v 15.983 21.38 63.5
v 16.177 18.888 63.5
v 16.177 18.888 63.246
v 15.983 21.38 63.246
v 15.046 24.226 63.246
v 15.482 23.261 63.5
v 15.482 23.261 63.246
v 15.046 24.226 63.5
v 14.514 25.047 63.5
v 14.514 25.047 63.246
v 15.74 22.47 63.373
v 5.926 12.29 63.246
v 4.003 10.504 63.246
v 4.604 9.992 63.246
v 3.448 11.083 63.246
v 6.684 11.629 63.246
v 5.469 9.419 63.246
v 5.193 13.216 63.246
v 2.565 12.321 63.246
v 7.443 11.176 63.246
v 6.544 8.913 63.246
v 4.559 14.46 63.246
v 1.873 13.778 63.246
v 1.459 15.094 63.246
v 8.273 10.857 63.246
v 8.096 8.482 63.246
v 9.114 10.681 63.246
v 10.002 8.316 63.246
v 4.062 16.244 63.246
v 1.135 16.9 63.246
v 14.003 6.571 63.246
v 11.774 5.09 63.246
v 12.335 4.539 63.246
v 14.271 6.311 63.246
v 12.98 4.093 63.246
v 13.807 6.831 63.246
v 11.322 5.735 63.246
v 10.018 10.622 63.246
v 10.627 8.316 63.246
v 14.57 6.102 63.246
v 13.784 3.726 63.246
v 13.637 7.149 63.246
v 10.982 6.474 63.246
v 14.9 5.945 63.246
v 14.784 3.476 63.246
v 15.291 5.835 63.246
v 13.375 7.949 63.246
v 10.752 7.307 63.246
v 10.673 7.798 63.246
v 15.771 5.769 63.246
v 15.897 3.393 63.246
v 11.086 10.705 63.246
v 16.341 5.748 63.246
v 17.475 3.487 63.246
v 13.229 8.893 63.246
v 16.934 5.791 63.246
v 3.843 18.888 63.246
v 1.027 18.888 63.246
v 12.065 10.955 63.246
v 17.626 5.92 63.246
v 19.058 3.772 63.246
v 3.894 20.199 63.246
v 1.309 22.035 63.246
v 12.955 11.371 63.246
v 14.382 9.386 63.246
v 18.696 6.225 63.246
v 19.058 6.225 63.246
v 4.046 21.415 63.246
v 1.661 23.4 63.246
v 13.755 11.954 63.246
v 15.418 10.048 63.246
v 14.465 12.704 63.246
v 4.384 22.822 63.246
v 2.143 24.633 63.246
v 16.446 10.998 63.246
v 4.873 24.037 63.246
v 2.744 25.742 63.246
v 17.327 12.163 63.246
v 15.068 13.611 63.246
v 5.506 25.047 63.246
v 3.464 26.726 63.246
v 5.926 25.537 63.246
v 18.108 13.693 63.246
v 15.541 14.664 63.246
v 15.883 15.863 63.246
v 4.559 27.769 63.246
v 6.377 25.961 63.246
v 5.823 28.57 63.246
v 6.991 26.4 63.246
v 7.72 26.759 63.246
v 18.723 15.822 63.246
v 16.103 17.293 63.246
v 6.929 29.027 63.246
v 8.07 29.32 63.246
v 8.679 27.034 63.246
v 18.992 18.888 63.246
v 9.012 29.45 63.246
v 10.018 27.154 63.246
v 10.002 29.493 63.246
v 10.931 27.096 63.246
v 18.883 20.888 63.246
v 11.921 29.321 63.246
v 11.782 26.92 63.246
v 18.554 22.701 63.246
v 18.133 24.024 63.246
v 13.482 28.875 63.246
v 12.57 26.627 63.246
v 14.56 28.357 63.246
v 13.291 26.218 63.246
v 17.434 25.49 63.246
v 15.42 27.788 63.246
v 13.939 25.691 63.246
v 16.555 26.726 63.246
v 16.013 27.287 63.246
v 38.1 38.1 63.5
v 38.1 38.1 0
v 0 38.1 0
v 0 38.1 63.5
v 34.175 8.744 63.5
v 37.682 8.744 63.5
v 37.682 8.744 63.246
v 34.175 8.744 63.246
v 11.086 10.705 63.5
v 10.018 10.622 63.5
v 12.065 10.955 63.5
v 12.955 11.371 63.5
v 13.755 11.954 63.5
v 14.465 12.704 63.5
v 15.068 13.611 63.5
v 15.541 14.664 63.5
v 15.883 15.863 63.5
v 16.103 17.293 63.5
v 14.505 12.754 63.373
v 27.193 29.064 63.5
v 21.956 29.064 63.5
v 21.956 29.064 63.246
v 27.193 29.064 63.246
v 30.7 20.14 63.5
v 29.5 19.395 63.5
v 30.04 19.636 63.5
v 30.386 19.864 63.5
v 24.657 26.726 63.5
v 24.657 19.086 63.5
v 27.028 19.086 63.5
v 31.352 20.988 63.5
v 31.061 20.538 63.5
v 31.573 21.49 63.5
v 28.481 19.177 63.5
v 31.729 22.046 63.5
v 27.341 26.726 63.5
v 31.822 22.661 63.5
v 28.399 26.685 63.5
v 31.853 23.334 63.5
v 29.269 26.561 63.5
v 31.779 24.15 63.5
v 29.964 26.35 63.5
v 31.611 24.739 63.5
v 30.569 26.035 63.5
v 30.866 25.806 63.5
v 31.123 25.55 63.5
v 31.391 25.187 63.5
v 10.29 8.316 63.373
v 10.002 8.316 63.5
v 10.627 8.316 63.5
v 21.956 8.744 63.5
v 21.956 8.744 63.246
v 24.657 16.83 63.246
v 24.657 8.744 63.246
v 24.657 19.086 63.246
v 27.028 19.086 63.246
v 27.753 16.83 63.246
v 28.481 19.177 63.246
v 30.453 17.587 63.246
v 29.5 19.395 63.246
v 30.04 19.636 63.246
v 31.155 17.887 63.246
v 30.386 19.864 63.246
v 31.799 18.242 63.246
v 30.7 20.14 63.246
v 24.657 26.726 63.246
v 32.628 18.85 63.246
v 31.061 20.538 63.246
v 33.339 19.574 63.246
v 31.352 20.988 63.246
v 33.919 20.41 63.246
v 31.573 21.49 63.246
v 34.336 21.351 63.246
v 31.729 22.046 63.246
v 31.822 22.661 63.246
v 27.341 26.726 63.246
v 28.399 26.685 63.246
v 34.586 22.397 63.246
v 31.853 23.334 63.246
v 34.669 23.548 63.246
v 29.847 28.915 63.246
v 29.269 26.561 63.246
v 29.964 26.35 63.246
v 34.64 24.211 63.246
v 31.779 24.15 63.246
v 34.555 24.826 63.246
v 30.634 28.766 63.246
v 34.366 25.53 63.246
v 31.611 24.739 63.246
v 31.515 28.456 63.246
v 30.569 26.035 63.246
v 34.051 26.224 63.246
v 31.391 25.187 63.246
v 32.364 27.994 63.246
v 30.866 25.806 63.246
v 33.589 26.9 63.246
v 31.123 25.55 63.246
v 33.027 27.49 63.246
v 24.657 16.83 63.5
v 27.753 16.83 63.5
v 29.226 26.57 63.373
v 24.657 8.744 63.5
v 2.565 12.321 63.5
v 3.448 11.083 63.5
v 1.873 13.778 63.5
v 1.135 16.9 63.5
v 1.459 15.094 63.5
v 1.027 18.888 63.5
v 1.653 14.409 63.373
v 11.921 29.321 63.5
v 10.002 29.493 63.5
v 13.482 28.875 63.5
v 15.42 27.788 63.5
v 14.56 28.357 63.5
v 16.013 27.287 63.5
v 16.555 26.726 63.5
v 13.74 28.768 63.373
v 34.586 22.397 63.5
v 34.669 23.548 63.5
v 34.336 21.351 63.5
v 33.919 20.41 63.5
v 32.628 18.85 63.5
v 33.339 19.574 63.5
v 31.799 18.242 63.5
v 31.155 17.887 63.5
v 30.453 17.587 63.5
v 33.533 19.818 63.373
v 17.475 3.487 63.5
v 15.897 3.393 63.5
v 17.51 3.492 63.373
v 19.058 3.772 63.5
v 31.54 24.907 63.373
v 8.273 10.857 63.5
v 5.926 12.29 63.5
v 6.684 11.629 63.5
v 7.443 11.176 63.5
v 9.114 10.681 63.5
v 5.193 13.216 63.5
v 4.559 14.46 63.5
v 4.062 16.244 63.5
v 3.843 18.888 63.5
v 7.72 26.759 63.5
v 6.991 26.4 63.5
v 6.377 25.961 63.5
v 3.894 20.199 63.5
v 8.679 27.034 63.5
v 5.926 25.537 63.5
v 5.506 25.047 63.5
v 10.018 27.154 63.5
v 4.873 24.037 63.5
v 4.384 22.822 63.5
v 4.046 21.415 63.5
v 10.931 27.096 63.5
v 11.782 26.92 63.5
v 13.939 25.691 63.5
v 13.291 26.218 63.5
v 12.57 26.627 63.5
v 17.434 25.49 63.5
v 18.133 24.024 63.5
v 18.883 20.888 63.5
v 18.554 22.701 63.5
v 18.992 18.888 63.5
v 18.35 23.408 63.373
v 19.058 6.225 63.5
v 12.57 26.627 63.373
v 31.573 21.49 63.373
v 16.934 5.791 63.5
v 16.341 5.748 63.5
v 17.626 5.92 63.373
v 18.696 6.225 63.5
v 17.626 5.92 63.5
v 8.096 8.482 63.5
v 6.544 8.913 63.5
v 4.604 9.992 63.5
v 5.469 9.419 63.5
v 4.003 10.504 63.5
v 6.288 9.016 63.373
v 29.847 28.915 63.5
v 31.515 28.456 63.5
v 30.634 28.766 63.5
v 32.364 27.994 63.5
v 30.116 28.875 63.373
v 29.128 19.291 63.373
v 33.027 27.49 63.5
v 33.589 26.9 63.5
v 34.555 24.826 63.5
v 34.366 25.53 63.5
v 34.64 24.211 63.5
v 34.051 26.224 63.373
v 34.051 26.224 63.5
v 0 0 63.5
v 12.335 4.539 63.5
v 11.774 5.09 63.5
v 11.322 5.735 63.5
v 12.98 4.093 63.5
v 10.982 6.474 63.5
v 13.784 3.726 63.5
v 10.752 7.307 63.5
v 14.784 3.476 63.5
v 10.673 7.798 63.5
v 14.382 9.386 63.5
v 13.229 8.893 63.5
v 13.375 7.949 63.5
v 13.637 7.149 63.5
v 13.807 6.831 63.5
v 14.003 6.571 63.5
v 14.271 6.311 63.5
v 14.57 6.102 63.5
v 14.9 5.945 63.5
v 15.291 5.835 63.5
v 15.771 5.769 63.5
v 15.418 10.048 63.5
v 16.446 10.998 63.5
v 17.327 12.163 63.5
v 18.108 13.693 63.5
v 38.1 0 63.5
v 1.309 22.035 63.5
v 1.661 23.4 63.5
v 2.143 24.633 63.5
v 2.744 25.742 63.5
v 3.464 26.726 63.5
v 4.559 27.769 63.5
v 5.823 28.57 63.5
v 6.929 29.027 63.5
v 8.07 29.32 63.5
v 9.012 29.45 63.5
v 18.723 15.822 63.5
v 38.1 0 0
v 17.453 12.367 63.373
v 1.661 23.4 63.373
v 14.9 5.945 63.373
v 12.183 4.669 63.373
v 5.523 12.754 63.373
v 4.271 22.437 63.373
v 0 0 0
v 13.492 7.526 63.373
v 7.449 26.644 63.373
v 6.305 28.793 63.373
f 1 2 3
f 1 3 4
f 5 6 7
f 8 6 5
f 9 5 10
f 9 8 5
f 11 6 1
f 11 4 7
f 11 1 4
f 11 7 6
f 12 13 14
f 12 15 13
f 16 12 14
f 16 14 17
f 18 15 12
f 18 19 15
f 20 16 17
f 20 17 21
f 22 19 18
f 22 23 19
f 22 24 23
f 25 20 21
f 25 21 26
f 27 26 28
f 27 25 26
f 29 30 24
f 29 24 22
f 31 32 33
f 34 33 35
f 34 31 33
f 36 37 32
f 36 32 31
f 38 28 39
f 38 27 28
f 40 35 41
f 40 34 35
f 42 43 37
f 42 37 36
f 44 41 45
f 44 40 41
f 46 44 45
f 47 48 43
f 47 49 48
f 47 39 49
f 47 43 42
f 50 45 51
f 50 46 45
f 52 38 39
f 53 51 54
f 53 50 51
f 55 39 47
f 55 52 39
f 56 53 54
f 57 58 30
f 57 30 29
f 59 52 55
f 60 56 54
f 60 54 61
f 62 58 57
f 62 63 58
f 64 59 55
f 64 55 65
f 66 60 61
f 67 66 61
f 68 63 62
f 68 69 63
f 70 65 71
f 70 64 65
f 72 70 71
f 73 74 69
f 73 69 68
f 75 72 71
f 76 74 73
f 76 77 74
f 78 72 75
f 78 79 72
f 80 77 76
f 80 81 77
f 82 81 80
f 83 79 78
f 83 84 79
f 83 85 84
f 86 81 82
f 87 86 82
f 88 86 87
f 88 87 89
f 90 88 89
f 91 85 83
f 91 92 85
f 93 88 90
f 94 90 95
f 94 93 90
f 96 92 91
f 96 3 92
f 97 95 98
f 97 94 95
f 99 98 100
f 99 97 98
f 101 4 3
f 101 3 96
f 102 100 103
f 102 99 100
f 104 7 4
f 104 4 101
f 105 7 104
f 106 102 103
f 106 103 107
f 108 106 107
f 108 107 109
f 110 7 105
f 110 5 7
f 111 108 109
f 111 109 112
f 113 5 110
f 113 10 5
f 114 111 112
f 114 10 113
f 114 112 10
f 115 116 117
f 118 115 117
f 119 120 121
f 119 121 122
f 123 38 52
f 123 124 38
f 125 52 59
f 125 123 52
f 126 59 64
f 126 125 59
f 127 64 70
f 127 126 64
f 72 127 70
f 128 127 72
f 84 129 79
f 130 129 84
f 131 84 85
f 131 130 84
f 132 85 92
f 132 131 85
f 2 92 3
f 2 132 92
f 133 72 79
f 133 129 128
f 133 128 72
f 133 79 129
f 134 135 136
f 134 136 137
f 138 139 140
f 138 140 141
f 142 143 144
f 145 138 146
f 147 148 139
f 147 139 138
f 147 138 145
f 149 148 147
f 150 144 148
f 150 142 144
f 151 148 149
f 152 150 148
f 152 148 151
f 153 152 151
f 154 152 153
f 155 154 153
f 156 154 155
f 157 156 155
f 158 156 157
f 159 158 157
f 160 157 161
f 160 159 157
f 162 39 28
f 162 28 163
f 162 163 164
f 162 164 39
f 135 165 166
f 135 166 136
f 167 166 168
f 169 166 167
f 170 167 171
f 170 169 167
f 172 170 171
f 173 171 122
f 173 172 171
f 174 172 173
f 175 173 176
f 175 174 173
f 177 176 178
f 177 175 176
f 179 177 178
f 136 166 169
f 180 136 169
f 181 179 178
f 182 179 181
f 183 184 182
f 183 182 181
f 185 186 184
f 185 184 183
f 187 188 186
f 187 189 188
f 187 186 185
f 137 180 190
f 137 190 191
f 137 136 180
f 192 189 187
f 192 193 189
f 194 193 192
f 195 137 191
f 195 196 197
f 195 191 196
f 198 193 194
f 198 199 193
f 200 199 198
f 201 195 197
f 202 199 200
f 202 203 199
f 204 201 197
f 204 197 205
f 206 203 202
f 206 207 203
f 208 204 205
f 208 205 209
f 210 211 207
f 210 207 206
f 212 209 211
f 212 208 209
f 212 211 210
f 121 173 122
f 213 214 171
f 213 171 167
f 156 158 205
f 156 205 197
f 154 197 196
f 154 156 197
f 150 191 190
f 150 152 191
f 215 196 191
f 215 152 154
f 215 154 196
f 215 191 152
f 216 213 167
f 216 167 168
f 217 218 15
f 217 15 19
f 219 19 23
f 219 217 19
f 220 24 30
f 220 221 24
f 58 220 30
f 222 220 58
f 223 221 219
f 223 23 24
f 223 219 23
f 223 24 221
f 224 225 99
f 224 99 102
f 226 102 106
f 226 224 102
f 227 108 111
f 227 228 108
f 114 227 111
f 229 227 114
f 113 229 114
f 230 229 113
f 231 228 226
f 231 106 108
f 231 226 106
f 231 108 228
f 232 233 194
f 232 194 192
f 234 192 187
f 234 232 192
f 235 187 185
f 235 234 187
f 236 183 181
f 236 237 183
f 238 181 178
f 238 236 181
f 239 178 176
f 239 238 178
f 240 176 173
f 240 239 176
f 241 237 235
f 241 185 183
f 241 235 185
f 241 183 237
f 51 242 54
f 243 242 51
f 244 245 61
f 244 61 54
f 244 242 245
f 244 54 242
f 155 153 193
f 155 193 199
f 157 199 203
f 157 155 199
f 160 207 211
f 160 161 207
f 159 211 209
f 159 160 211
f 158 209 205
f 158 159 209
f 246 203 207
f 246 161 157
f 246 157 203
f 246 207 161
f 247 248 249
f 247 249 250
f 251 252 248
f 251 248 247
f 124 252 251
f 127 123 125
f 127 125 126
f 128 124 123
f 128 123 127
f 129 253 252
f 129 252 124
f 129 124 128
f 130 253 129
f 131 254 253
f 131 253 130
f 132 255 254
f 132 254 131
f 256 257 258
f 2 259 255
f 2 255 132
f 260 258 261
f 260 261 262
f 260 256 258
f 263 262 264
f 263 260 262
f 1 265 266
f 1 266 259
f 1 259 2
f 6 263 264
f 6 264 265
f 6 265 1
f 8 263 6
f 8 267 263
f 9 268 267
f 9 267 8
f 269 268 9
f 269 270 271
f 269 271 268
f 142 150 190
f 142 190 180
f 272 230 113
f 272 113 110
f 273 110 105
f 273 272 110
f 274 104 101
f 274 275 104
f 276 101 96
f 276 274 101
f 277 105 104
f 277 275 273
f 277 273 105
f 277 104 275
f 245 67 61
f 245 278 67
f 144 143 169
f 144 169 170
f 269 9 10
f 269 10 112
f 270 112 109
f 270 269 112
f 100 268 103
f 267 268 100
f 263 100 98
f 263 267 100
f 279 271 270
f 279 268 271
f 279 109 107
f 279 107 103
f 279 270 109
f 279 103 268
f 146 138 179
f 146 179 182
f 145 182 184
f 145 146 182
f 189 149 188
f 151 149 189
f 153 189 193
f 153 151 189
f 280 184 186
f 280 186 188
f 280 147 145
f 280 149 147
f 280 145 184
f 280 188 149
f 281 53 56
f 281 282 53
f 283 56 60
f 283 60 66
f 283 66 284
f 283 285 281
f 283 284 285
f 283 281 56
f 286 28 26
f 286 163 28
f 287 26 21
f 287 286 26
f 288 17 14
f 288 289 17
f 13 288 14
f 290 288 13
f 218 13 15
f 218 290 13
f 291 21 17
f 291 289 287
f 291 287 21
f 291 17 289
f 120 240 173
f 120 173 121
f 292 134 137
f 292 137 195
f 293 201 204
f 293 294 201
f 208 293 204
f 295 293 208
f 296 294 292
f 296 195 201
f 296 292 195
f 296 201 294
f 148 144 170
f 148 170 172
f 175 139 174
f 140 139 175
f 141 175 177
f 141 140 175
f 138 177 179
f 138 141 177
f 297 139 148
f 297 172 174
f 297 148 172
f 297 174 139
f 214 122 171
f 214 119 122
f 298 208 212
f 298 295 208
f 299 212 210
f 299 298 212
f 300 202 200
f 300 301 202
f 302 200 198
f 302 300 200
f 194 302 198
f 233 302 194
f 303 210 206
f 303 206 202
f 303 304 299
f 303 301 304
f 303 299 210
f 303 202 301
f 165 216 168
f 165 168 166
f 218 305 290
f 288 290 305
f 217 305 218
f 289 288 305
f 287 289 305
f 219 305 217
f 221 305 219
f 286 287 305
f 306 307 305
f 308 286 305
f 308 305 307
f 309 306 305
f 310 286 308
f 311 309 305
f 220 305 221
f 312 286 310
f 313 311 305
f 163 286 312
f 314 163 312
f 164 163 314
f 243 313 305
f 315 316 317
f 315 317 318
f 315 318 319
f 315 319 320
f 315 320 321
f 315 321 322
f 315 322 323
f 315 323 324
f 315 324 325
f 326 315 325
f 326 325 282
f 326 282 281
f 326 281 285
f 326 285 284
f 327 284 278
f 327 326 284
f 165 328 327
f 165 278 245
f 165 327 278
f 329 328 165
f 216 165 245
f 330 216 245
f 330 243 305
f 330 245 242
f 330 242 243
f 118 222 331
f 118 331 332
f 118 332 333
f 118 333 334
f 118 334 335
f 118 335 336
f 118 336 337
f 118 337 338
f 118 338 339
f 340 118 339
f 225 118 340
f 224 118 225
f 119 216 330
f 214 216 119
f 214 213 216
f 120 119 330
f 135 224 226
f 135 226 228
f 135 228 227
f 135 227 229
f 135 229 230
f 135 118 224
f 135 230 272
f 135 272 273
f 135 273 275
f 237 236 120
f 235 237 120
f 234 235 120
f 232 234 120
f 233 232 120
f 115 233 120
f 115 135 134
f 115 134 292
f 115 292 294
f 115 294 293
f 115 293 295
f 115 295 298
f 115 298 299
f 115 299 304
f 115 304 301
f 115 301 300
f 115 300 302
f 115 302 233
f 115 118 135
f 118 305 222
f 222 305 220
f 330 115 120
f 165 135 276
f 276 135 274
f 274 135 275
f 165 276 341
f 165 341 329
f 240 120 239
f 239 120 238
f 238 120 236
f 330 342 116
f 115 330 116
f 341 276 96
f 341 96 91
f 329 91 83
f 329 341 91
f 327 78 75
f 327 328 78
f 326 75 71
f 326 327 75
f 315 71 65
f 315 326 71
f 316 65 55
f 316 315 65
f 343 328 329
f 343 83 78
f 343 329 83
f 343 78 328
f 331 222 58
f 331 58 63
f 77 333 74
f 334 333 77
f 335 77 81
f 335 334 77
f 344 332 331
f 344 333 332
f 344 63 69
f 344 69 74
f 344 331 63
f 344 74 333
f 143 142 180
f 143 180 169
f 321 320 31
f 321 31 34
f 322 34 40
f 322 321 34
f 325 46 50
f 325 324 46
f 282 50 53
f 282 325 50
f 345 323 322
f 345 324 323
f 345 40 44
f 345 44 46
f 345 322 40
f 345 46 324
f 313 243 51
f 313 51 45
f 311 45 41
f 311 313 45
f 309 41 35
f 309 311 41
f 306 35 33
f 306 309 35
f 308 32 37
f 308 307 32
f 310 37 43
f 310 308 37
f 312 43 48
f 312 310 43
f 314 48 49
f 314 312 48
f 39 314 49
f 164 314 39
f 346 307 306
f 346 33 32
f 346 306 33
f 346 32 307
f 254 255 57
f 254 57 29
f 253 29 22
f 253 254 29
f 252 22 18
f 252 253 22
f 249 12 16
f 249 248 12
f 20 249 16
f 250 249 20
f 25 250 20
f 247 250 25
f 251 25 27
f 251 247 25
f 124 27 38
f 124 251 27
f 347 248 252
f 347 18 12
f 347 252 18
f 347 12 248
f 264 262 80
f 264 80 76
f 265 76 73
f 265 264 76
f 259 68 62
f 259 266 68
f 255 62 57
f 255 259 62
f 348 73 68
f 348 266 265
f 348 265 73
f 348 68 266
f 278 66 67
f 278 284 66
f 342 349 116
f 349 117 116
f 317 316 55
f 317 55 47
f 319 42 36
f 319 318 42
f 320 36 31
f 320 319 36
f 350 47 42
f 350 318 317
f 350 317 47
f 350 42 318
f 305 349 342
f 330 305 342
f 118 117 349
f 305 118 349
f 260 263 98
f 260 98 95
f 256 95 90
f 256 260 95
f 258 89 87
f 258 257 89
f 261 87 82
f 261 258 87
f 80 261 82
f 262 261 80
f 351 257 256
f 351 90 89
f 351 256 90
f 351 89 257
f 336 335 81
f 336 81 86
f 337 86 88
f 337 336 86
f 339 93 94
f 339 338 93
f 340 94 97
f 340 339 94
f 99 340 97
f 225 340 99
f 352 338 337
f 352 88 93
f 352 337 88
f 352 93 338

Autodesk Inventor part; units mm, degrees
ref_plane "YZ Plane" through (0, 0, 0) normal (1, 0, 0) x (0, 1, 0)
ref_plane "XZ Plane" through (0, 0, 0) normal (0, 1, 0) x (-1, 0, 0)
ref_plane "XY Plane" through (0, 0, 0) normal (0, 0, 1) x (1, 0, 0)
sketch "Sketch1" plane through (0, 0, 0) normal (0, 0, 1) x (1, 0, 0)
  line L0 (0, 0) -> (38.1, 0)
  line L1 (38.1, 0) -> (38.1, 38.1)
  line L2 (38.1, 38.1) -> (0, 38.1)
  line L3 (0, 38.1) -> (0, 0)
  dimension "d0" = 38.1
  dimension "d1" = 38.1
extrude "Extrusion1" add sketch "Sketch1" along normal blind 63.5
sketch "Sketch2" plane through (0, 0, 63.5) normal (0, 0, 1) x (1, 0, 0)
  line L0 (0.1215, 29.4926) -> (23.3191, 29.4926) construction
  line L1 (23.3191, 29.4926) -> (23.3191, 13.1802) construction
  line L2 (23.3191, 13.1802) -> (0.1215, 13.1802) construction
  line L3 (0.1215, 13.1802) -> (0.1215, 29.4926) construction
  spline S0 degree 2 poles (19.0583, 3.7715) (18.3173, 3.5904) (16.7036, 3.3928) (15.8967, 3.3928) knots 0 0 0 1 2 2 2
  spline S1 degree 2 poles (15.8967, 3.3928) (13.6078, 3.3928) (10.7591, 5.9451) (10.6273, 8.3164) knots 0 0 0 1 2 2 2
  spline S2 degree 2 poles (10.6273, 8.3164) (10.4462, 8.3164) (10.1333, 8.3164) (10.0016, 8.3164) knots 0 0 0 1 2 2 2
  spline S3 degree 2 poles (10.0016, 8.3164) (7.9432, 8.3164) (4.6334, 9.716) (3.4478, 11.0828) knots 0 0 0 1 2 2 2
  spline S4 degree 2 poles (3.4478, 11.0828) (2.2787, 12.4331) (1.0272, 16.3851) (1.0272, 18.888) knots 0 0 0 1 2 2 2
  spline S5 degree 2 poles (1.0272, 18.888) (1.0272, 21.4569) (2.2951, 25.343) (3.4643, 26.7262) knots 0 0 0 1 2 2 2
  spline S6 degree 2 poles (3.4643, 26.7262) (4.6499, 28.093) (7.9597, 29.4926) (10.0016, 29.4926) knots 0 0 0 1 2 2 2
  spline S7 degree 2 poles (10.0016, 29.4926) (12.0764, 29.4926) (15.4027, 28.0436) (16.5554, 26.7262) knots 0 0 0 1 2 2 2
  spline S8 degree 2 poles (16.5554, 26.7262) (17.708, 25.3924) (18.9924, 21.4239) (18.9924, 18.888) knots 0 0 0 1 2 2 2
  spline S9 degree 2 poles (18.9924, 18.888) (18.9924, 14.936) (15.9132, 9.7984) (13.2291, 8.8927) knots 0 0 0 1 2 2 2
  spline S10 degree 2 poles (13.2291, 8.8927) (13.2949, 8.1352) (13.6901, 6.9167) (14.003, 6.5709) knots 0 0 0 1 2 2 2
  spline S11 degree 2 poles (14.003, 6.5709) (14.3817, 6.1427) (15.4191, 5.7475) (16.3413, 5.7475) knots 0 0 0 1 2 2 2
  spline S12 degree 2 poles (16.3413, 5.7475) (16.8847, 5.7475) (18.3667, 6.0933) (18.696, 6.2251) knots 0 0 0 1 2 2 2
  line L4 (18.696, 6.2251) -> (19.0583, 6.2251)
  line L5 (19.0583, 6.2251) -> (19.0583, 3.7715)
  spline S13 degree 2 poles (16.1766, 18.888) (16.1766, 20.9134) (15.3039, 24.0257) (14.5135, 25.0466) knots 0 0 0 1 2 2 2
  spline S14 degree 2 poles (14.5135, 25.0466) (13.7066, 26.1005) (11.4342, 27.1544) (10.018, 27.1544) knots 0 0 0 1 2 2 2
  spline S15 degree 2 poles (10.018, 27.1544) (8.5525, 27.1544) (6.346, 26.1334) (5.5062, 25.0466) knots 0 0 0 1 2 2 2
  spline S16 degree 2 poles (5.5062, 25.0466) (4.6993, 24.0092) (3.843, 20.864) (3.843, 18.888) knots 0 0 0 1 2 2 2
  spline S17 degree 2 poles (3.843, 18.888) (3.843, 14.8866) (7.2022, 10.6217) (10.018, 10.6217) knots 0 0 0 1 2 2 2
  spline S18 degree 2 poles (10.018, 10.6217) (12.8339, 10.6217) (16.1766, 14.8866) (16.1766, 18.888) knots 0 0 0 1 2 2 2
  line L6 (37.6822, 8.7445) -> (34.1748, 8.7445)
  line L7 (34.1748, 8.7445) -> (27.7528, 16.8297)
  line L8 (27.7528, 16.8297) -> (24.657, 16.8297)
  line L9 (24.657, 16.8297) -> (24.657, 8.7445)
  line L10 (24.657, 8.7445) -> (21.9565, 8.7445)
  line L11 (21.9565, 8.7445) -> (21.9565, 29.0645)
  line L12 (21.9565, 29.0645) -> (27.1929, 29.0645)
  spline S19 degree 2 poles (27.1929, 29.0645) (28.9384, 29.0645) (31.2931, 28.6858) (32.3635, 27.9942) knots 0 0 0 1 2 2 2
  spline S20 degree 2 poles (32.3635, 27.9942) (33.4338, 27.3026) (34.6688, 25.1454) (34.6688, 23.5481) knots 0 0 0 1 2 2 2
  spline S21 degree 2 poles (34.6688, 23.5481) (34.6688, 21.3251) (32.3964, 18.3117) (30.4533, 17.5872) knots 0 0 0 1 2 2 2
  line L13 (30.4533, 17.5872) -> (37.6822, 8.7445)
  spline S22 degree 2 poles (31.853, 23.3341) (31.853, 24.2233) (31.2273, 25.59) (30.5686, 26.0346) knots 0 0 0 1 2 2 2
  spline S23 degree 2 poles (30.5686, 26.0346) (29.9922, 26.4133) (28.4608, 26.7262) (27.3411, 26.7262) knots 0 0 0 1 2 2 2
  line L14 (27.3411, 26.7262) -> (24.657, 26.7262)
  line L15 (24.657, 26.7262) -> (24.657, 19.0856)
  line L16 (24.657, 19.0856) -> (27.0282, 19.0856)
  spline S24 degree 2 poles (27.0282, 19.0856) (28.1974, 19.0856) (30.0581, 19.4973) (30.7003, 20.1395) knots 0 0 0 1 2 2 2
  spline S25 degree 2 poles (30.7003, 20.1395) (31.2931, 20.6994) (31.853, 22.2802) (31.853, 23.3341) knots 0 0 0 1 2 2 2
  point P0 (0, 0)
extrude "Extrusion2" cut sketch "Sketch2" against normal blind 0.254
equation "\"d1\" = d0"
properties part number "Container 1 1 2 and half"
